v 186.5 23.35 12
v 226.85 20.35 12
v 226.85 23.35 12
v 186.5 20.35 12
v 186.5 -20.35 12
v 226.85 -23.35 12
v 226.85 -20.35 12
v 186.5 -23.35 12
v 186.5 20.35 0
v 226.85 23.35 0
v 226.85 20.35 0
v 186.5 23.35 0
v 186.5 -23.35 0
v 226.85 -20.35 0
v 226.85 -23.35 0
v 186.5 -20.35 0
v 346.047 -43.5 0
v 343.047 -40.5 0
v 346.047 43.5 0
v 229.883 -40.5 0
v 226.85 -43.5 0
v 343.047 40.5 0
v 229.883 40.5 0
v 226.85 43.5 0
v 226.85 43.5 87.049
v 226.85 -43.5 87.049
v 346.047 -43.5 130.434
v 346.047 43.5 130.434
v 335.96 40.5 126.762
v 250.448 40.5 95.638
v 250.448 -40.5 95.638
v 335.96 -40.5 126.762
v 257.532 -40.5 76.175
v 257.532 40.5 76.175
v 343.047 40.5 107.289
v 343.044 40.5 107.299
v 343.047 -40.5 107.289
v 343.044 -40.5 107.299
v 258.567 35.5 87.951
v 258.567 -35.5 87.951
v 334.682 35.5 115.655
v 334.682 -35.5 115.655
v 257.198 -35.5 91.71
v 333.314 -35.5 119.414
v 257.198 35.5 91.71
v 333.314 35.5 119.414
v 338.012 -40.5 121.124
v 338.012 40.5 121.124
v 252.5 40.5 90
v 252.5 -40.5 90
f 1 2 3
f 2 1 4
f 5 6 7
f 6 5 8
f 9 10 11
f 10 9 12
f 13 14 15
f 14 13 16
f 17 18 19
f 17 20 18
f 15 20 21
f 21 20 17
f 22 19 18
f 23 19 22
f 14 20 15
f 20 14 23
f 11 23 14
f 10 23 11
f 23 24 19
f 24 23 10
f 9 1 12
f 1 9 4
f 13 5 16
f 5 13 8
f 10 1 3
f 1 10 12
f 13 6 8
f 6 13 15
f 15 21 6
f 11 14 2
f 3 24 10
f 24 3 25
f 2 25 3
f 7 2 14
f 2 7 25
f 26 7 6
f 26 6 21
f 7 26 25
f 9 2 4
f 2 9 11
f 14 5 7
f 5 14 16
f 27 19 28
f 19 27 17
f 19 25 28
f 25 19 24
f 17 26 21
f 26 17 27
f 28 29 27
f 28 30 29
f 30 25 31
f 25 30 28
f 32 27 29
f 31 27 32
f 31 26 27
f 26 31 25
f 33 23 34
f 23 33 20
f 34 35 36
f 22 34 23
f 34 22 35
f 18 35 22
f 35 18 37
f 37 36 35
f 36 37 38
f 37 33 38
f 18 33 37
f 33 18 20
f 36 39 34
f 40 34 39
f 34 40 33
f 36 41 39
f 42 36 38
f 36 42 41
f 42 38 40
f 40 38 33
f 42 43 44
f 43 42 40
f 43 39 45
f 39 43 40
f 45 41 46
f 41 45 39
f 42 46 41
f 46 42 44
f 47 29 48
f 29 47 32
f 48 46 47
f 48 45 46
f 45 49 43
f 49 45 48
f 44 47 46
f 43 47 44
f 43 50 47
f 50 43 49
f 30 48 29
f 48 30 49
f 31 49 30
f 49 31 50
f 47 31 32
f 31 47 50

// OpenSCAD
// Scanning Rig - Optional camera boost (raises and pitches the phone stand)
// Render this file to generate scan_boost.stl
//
// Authored about the platter axis, in assembled position behind the rig link's
// rail, so CI's mating-pair interference check compares it against
// rig_link.stl where it actually sits. The viewers call geometry.center(), so
// the off-centre origin is invisible there.

include <_scanning_rig.scad>

scan_boost();
